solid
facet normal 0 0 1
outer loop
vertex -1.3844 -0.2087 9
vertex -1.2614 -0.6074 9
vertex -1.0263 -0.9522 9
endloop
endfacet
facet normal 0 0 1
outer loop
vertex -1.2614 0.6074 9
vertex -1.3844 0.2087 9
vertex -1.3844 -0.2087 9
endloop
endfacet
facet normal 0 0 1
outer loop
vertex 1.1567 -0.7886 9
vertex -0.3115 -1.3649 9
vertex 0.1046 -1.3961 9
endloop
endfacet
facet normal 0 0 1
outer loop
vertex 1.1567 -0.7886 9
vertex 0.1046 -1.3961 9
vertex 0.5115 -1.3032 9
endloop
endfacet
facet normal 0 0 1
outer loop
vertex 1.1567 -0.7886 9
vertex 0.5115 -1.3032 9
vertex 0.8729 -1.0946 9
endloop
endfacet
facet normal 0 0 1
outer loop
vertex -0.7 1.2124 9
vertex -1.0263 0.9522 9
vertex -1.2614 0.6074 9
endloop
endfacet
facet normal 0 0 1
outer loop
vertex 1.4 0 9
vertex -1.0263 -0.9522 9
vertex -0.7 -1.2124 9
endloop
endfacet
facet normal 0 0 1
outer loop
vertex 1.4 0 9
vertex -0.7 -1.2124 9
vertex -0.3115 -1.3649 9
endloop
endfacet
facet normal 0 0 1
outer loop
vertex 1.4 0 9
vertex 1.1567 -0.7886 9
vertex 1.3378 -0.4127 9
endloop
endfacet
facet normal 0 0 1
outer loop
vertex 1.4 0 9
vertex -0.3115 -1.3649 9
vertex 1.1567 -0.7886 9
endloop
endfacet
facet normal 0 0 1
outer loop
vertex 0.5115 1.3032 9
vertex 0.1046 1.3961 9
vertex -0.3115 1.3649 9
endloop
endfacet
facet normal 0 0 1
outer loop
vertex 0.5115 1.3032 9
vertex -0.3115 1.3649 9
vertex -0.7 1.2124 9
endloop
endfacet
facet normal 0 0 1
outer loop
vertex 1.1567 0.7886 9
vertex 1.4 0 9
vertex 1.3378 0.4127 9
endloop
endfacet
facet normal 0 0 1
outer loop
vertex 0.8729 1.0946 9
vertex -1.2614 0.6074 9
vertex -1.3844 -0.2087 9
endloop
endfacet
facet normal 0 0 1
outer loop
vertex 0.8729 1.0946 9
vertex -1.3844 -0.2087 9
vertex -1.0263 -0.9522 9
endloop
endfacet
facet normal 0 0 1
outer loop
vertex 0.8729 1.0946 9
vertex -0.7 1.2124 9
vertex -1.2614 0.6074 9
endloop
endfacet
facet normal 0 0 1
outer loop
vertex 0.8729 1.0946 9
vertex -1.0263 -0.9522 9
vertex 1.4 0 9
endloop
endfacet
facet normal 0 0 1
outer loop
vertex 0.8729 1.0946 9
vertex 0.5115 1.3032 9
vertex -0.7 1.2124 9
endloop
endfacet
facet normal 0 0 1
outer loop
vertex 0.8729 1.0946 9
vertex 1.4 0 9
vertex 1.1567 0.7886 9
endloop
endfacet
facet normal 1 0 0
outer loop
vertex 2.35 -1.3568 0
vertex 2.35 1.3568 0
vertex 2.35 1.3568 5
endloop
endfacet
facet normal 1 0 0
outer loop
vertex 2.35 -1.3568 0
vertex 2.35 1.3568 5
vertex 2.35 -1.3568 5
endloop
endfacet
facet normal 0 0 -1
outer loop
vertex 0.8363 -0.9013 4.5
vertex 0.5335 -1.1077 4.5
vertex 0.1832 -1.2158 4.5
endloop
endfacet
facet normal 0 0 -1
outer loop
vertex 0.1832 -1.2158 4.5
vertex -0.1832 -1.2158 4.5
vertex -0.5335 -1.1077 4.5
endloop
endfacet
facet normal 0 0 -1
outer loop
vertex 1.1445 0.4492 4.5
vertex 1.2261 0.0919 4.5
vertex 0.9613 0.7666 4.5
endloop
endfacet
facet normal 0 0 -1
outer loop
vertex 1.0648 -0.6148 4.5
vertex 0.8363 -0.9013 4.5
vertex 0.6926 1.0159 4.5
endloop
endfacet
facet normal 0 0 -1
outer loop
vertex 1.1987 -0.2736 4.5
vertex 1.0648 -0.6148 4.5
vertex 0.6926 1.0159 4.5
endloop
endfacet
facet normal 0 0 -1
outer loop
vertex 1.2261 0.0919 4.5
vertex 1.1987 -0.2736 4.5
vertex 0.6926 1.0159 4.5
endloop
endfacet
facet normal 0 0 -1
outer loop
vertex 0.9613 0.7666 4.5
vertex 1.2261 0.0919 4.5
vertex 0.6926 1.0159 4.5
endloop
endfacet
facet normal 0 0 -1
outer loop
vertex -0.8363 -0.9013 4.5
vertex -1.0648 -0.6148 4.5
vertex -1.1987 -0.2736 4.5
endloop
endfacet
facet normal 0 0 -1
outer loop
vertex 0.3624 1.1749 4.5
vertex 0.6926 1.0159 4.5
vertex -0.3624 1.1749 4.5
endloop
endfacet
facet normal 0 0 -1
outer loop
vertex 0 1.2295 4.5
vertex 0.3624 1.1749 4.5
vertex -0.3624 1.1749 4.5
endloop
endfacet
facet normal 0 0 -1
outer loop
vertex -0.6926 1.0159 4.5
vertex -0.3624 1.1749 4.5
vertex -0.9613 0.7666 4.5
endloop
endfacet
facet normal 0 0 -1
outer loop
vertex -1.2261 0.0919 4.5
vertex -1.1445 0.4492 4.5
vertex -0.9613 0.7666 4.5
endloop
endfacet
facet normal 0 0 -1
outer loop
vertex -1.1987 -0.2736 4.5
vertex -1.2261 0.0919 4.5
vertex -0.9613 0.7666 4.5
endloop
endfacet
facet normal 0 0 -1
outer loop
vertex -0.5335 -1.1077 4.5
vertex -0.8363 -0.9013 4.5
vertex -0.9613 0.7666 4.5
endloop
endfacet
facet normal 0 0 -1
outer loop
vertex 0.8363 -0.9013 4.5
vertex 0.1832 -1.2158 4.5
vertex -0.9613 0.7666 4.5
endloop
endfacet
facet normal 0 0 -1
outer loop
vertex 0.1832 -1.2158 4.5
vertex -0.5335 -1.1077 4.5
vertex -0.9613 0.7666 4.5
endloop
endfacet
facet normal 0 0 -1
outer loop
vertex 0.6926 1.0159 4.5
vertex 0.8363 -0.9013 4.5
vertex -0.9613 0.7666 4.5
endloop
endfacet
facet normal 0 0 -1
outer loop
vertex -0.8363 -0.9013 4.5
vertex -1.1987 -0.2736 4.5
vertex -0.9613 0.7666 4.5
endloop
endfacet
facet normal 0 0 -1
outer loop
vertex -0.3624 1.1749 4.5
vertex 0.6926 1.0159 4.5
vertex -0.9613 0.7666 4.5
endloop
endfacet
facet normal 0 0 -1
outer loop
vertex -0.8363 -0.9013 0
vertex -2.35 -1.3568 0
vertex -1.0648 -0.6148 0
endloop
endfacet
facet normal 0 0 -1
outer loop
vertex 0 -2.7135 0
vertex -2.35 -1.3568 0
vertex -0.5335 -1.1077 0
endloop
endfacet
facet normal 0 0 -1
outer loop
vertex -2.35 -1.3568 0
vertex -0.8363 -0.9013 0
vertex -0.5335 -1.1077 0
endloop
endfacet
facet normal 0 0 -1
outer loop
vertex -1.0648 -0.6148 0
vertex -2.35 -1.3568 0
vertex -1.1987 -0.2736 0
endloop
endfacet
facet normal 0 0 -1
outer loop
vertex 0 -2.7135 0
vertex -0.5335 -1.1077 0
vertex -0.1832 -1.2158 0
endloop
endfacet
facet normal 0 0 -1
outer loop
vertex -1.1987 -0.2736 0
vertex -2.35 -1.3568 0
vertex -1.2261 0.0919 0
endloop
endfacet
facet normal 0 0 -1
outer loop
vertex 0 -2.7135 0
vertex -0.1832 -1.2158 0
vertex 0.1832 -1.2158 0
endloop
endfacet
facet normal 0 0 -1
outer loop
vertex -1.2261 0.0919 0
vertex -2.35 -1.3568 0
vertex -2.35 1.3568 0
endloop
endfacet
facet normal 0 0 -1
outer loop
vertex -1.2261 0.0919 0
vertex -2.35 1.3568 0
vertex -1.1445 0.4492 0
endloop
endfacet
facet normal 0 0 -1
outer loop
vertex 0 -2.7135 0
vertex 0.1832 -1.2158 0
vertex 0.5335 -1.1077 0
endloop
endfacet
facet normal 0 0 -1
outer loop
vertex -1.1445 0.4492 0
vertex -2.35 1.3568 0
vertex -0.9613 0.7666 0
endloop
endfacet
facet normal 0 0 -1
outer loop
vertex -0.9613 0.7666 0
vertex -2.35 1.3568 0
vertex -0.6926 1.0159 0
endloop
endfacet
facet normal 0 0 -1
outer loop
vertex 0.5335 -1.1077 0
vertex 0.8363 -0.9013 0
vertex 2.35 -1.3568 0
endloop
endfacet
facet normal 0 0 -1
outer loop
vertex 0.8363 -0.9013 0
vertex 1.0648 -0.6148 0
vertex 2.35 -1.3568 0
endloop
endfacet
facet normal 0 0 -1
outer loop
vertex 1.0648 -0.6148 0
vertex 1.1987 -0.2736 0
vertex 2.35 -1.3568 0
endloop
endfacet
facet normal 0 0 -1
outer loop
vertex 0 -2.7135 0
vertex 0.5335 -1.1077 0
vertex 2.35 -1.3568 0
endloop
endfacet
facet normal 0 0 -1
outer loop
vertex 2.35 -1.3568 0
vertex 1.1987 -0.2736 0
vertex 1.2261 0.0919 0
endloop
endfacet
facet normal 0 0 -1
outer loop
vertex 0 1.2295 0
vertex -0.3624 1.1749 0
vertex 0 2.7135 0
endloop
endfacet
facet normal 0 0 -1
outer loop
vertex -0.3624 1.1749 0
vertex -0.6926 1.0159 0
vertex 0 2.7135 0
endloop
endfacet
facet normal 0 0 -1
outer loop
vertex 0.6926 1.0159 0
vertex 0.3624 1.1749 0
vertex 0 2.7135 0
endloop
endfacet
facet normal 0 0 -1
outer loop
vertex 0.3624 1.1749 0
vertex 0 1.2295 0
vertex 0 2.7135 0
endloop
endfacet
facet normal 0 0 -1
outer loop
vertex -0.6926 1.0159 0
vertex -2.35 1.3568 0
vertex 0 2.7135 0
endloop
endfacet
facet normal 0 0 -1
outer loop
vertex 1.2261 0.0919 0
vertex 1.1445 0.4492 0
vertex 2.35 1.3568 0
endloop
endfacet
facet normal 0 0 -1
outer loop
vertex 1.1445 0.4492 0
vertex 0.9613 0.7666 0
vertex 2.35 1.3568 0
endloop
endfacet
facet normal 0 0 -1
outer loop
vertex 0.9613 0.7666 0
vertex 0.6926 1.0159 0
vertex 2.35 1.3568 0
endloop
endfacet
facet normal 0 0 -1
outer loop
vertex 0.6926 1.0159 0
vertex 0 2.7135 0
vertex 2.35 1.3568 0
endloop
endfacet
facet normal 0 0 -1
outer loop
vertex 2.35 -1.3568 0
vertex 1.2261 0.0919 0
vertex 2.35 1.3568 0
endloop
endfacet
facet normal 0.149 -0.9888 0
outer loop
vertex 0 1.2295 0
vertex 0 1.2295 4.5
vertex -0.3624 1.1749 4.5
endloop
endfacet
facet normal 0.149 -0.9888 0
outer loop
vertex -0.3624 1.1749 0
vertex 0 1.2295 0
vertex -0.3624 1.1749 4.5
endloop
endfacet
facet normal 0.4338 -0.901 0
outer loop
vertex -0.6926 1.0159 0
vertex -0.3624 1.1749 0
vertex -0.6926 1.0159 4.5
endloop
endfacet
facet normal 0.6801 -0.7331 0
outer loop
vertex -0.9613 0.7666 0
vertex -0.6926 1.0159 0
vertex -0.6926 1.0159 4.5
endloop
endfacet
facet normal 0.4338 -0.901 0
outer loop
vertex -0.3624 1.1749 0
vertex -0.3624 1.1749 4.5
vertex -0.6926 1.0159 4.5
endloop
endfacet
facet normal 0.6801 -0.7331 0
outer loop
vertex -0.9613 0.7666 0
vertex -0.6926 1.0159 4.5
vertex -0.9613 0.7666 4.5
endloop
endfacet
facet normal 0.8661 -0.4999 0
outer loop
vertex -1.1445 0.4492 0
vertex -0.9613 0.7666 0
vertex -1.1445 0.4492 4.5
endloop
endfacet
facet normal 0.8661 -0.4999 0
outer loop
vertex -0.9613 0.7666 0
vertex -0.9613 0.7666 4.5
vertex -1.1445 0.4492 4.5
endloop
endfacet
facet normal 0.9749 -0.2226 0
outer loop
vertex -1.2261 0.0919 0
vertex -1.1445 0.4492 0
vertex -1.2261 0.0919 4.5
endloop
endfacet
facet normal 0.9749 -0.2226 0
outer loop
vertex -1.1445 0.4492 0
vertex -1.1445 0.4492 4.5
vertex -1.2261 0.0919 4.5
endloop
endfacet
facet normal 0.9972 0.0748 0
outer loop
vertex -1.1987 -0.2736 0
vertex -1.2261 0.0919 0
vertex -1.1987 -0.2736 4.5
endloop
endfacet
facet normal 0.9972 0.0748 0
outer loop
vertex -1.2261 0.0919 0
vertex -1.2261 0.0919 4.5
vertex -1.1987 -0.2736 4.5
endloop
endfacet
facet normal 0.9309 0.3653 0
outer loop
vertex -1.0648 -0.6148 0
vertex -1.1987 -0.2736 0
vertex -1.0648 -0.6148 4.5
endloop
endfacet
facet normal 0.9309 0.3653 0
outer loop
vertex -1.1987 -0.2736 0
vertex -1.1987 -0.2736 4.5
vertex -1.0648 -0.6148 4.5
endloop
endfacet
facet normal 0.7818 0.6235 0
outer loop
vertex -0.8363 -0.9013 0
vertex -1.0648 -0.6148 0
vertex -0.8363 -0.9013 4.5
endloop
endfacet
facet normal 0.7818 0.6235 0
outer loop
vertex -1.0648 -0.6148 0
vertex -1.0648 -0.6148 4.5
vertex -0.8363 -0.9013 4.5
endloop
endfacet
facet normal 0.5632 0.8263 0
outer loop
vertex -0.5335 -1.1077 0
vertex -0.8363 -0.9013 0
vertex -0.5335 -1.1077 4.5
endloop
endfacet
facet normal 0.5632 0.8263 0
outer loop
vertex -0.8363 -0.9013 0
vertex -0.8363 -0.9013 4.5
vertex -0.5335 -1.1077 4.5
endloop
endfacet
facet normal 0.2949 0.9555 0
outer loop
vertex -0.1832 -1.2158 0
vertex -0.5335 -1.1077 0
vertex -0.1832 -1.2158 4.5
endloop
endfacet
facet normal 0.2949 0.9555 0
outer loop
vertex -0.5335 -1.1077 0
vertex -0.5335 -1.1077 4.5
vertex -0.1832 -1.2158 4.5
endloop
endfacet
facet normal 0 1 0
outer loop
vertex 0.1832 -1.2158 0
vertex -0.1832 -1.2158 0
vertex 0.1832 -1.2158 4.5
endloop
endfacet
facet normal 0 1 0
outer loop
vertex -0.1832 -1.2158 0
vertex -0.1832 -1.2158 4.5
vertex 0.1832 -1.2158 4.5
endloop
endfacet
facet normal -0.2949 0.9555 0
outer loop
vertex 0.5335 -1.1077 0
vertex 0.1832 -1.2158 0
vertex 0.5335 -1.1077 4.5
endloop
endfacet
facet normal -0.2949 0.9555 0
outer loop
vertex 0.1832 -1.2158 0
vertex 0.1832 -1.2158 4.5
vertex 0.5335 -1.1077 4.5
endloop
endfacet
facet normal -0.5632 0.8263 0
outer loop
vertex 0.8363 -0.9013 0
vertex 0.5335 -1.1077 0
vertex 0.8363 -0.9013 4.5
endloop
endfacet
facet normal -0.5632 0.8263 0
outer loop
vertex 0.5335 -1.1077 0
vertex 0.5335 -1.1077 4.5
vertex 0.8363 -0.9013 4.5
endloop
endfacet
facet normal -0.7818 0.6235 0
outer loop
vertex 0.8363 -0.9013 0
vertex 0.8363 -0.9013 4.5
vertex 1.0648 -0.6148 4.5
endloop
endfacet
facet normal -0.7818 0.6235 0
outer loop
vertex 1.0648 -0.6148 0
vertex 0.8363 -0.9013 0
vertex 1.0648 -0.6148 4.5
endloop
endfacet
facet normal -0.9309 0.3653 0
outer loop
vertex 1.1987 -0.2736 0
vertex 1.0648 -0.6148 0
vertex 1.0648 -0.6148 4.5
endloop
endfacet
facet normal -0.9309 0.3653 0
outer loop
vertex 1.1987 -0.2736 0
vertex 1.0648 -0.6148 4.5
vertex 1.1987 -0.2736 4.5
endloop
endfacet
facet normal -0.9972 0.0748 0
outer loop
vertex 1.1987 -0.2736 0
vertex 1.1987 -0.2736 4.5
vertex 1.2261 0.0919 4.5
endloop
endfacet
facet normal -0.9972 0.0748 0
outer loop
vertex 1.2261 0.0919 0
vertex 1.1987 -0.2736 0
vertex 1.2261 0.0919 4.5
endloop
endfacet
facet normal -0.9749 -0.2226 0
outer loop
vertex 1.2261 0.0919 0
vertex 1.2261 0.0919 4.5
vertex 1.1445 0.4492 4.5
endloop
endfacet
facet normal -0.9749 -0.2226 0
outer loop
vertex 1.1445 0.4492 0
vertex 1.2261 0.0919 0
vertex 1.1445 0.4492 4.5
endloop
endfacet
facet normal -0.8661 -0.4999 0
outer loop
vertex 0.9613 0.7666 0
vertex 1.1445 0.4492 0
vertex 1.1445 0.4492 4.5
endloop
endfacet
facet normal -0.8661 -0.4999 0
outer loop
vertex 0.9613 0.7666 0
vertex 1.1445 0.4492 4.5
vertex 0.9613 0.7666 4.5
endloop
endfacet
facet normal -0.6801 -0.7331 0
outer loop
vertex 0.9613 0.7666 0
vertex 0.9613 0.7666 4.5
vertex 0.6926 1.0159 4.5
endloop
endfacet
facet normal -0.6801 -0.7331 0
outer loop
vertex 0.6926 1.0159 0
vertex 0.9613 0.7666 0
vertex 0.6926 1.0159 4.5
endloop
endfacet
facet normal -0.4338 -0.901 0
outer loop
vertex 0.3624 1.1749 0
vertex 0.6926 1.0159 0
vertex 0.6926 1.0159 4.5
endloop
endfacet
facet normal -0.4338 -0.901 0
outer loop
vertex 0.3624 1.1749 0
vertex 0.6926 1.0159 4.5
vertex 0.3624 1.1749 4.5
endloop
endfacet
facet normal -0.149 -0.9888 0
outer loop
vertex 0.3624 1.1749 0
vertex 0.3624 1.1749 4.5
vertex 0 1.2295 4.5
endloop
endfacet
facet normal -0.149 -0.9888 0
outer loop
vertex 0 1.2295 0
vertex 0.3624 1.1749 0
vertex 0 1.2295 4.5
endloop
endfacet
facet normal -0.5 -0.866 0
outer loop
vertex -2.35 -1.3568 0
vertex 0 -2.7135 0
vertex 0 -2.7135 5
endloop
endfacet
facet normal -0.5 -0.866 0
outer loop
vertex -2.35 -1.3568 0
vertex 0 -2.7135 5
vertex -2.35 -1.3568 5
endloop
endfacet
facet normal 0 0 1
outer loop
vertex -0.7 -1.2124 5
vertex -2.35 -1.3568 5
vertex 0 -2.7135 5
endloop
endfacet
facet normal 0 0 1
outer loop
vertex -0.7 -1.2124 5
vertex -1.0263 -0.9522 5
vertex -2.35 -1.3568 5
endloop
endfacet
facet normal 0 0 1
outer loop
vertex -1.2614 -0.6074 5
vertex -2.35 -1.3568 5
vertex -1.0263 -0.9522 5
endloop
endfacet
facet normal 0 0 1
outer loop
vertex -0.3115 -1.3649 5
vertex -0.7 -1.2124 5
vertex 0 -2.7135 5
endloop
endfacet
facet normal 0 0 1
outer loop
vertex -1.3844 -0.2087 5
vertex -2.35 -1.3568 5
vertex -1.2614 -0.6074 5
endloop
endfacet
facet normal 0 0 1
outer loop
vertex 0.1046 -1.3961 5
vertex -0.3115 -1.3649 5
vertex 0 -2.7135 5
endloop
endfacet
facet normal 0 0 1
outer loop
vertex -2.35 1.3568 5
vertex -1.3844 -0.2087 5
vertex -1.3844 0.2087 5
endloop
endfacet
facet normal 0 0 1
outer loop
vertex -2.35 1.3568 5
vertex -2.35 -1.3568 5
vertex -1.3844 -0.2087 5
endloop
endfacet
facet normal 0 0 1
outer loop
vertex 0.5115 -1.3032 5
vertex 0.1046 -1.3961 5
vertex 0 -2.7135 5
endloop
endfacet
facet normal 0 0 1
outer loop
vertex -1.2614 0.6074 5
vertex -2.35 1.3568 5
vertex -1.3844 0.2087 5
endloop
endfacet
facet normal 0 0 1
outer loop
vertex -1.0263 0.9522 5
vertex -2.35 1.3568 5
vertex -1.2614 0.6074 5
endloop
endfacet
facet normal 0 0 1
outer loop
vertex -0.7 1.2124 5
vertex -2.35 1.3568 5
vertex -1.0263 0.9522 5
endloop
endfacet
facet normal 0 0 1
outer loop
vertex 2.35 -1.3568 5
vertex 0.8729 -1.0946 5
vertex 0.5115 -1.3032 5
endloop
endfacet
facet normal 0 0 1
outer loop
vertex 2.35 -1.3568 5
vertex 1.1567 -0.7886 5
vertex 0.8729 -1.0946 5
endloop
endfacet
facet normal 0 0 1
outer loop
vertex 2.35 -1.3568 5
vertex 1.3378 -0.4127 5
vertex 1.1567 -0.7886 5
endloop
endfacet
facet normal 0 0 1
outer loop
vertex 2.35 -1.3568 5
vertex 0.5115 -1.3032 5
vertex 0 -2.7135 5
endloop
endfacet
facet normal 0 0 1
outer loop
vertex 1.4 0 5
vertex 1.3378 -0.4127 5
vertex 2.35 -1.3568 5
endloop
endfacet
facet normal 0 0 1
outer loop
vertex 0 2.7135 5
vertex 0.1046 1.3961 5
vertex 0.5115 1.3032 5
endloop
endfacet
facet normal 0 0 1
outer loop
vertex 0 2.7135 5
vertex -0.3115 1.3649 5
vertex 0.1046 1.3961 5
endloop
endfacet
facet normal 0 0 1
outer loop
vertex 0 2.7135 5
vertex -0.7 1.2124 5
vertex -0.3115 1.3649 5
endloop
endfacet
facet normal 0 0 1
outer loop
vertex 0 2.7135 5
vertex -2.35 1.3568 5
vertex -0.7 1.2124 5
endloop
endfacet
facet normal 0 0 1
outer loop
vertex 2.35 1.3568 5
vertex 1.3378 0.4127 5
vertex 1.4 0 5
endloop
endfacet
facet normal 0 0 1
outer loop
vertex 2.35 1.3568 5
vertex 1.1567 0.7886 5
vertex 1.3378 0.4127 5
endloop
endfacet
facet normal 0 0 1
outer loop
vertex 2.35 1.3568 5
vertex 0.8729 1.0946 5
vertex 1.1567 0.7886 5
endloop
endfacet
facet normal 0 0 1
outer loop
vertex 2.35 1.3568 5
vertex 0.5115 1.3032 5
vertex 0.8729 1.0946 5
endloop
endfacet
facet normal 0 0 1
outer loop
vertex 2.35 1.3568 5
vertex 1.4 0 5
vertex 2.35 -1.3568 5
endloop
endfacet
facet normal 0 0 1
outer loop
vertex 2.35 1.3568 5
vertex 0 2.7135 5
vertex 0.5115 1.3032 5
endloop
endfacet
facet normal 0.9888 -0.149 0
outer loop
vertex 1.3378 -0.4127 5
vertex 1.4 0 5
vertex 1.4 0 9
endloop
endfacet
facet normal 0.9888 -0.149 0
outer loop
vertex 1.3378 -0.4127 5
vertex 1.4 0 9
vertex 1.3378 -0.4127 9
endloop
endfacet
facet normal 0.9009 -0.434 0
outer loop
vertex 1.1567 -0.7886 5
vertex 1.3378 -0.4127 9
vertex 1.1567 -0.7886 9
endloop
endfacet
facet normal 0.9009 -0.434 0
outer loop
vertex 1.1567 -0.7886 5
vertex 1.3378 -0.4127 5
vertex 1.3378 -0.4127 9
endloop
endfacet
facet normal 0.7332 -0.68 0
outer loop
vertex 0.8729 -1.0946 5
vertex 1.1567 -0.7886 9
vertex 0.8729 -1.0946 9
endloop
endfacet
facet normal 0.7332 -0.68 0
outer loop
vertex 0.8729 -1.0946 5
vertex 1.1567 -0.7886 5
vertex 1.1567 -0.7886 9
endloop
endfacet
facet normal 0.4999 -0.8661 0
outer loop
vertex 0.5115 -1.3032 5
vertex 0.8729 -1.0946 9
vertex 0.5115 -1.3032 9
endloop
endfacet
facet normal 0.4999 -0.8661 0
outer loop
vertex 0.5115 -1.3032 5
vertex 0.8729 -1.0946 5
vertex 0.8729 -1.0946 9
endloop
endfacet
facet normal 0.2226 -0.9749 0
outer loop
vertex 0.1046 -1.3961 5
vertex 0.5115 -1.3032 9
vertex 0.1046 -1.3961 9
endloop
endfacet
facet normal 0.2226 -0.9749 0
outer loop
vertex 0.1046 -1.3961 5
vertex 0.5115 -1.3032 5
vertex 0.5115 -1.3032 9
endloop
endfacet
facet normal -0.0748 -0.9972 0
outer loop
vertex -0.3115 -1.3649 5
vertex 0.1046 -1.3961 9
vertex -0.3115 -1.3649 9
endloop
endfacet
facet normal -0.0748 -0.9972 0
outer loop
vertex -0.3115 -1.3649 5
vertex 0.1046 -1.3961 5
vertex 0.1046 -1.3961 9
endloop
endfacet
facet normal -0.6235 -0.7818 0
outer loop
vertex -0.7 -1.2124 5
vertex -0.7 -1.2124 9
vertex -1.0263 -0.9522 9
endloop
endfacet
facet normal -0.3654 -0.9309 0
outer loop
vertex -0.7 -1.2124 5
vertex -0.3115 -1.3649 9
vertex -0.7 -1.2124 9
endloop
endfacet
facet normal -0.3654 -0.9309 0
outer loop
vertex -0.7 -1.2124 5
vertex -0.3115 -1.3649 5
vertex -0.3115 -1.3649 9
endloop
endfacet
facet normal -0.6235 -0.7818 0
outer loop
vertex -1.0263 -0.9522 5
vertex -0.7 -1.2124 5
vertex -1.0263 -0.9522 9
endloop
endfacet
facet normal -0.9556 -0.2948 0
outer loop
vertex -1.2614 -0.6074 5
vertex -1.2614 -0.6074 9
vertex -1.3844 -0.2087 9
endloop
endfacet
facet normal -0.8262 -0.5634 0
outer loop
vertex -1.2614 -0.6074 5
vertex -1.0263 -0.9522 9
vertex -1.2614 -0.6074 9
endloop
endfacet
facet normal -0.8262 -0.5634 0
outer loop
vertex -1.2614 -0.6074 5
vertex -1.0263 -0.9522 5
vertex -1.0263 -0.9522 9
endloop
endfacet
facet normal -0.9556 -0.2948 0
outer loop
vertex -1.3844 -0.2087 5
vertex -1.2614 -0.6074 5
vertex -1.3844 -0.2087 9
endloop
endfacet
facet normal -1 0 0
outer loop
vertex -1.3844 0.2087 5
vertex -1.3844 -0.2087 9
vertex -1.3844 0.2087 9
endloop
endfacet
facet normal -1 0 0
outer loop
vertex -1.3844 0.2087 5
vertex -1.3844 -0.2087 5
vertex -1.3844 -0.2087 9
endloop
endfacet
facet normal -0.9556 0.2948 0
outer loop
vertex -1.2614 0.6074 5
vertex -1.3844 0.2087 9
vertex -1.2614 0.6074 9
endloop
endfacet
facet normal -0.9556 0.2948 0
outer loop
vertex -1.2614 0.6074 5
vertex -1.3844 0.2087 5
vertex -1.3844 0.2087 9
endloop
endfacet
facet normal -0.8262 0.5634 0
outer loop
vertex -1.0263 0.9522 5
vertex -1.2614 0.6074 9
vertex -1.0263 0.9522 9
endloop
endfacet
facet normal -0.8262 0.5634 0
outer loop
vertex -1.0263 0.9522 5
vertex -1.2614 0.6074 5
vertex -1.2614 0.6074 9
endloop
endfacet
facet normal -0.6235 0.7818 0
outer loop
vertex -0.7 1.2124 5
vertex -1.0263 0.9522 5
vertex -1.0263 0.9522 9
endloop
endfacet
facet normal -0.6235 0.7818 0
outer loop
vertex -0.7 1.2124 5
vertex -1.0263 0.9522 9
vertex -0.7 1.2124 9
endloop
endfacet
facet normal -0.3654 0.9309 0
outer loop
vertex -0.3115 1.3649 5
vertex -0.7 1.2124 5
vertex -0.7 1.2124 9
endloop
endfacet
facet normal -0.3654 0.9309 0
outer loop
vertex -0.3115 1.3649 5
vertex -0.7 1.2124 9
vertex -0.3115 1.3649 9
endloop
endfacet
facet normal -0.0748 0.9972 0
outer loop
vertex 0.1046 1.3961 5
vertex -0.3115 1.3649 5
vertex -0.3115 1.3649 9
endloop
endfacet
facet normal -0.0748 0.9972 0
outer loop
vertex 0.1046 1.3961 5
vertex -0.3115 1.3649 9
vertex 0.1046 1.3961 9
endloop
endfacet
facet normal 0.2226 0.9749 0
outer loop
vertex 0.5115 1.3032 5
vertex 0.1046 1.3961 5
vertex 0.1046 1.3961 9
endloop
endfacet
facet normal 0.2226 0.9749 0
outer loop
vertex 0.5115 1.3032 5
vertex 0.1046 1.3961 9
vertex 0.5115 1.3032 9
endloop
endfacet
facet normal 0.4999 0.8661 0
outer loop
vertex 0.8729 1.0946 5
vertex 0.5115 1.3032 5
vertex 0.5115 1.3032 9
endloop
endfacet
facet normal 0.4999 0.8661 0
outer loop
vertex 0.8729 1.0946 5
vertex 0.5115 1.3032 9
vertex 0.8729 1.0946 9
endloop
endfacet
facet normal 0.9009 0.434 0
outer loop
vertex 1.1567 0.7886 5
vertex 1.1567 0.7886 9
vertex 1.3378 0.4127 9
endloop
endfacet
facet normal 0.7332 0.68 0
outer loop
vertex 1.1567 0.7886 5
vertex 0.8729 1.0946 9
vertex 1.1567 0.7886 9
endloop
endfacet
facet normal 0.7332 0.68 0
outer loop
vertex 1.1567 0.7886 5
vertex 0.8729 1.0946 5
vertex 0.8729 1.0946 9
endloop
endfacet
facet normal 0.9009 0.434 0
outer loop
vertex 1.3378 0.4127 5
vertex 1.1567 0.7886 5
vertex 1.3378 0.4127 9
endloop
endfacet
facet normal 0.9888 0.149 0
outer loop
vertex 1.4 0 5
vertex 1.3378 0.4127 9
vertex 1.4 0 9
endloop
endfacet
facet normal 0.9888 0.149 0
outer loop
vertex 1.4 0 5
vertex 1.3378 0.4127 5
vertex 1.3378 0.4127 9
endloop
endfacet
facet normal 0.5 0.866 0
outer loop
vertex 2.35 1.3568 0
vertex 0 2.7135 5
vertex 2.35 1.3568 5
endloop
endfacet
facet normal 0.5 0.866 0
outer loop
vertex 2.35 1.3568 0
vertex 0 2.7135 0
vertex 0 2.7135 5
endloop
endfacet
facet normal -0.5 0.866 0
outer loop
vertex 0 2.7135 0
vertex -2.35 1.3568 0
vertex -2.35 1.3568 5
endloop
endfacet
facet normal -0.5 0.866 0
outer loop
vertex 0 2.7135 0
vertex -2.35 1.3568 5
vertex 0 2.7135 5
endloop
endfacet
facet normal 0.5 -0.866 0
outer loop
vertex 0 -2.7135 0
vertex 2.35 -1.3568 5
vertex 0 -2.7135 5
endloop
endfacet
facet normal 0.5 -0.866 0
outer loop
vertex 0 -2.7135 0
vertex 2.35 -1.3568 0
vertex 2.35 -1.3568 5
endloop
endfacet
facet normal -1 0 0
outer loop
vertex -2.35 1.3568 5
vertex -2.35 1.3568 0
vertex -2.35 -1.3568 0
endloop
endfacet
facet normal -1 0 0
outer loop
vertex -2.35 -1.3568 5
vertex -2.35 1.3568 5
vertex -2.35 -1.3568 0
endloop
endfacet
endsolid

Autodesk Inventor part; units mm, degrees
ref_plane "YZ Plane" through (0, 0, 0) normal (1, 0, 0) x (0, 1, 0)
ref_plane "XZ Plane" through (0, 0, 0) normal (0, 1, 0) x (-1, 0, 0)
ref_plane "XY Plane" through (0, 0, 0) normal (0, 0, 1) x (1, 0, 0)
sketch "Sketch1" plane through (0, 0, 0) normal (0, 0, 1) x (1, 0, 0)
  line L0 (2.35, 1.3568) -> (2.35, -1.3568)
  line L1 (2.35, -1.3568) -> (0, -2.7135)
  line L2 (0, -2.7135) -> (-2.35, -1.3568)
  line L3 (-2.35, 1.3568) -> (-2.35, -1.3568)
  line L4 (-2.35, 1.3568) -> (0, 2.7135)
  line L5 (0, 2.7135) -> (2.35, 1.3568)
  circle A0 centre (0, 0) radius 2.7135 construction
  line L6 (0, 29.0365) -> (0, -7.2493) construction
  line L7 (0, -14.5064) -> (0, 36.2936) projected
  line L8 (-3.799, 0) -> (3.799, 0) projected
  dimension "d0" = 5.4271
  dimension "d20" = 4.7
  dimension "d21" = 2.7136
extrude "Hexagon1" add sketch "Sketch1" along normal blind 5
hole "Hole1" at (0, 0, 0) direction (0, 0, 1) diameter 2.459 depth 4.5 thread size "M3x0.5" class "6H" standard "ISO Metric profile"
sketch "Sketch2" plane through (0, 0, 5) normal (0, 0, 1) x (1, 0, 0)
  circle A0 centre (0, 0) radius 1.4
  dimension "d22" = 2.8
extrude "Extrusion2" add sketch "Sketch2" along normal blind 4
thread "Thread3" size "M3x0.5" class "6g" standard "ISO Metric profile" full length
properties part number "Spacer-M3-05" material "Brass, Soft Yellow, Welded"
